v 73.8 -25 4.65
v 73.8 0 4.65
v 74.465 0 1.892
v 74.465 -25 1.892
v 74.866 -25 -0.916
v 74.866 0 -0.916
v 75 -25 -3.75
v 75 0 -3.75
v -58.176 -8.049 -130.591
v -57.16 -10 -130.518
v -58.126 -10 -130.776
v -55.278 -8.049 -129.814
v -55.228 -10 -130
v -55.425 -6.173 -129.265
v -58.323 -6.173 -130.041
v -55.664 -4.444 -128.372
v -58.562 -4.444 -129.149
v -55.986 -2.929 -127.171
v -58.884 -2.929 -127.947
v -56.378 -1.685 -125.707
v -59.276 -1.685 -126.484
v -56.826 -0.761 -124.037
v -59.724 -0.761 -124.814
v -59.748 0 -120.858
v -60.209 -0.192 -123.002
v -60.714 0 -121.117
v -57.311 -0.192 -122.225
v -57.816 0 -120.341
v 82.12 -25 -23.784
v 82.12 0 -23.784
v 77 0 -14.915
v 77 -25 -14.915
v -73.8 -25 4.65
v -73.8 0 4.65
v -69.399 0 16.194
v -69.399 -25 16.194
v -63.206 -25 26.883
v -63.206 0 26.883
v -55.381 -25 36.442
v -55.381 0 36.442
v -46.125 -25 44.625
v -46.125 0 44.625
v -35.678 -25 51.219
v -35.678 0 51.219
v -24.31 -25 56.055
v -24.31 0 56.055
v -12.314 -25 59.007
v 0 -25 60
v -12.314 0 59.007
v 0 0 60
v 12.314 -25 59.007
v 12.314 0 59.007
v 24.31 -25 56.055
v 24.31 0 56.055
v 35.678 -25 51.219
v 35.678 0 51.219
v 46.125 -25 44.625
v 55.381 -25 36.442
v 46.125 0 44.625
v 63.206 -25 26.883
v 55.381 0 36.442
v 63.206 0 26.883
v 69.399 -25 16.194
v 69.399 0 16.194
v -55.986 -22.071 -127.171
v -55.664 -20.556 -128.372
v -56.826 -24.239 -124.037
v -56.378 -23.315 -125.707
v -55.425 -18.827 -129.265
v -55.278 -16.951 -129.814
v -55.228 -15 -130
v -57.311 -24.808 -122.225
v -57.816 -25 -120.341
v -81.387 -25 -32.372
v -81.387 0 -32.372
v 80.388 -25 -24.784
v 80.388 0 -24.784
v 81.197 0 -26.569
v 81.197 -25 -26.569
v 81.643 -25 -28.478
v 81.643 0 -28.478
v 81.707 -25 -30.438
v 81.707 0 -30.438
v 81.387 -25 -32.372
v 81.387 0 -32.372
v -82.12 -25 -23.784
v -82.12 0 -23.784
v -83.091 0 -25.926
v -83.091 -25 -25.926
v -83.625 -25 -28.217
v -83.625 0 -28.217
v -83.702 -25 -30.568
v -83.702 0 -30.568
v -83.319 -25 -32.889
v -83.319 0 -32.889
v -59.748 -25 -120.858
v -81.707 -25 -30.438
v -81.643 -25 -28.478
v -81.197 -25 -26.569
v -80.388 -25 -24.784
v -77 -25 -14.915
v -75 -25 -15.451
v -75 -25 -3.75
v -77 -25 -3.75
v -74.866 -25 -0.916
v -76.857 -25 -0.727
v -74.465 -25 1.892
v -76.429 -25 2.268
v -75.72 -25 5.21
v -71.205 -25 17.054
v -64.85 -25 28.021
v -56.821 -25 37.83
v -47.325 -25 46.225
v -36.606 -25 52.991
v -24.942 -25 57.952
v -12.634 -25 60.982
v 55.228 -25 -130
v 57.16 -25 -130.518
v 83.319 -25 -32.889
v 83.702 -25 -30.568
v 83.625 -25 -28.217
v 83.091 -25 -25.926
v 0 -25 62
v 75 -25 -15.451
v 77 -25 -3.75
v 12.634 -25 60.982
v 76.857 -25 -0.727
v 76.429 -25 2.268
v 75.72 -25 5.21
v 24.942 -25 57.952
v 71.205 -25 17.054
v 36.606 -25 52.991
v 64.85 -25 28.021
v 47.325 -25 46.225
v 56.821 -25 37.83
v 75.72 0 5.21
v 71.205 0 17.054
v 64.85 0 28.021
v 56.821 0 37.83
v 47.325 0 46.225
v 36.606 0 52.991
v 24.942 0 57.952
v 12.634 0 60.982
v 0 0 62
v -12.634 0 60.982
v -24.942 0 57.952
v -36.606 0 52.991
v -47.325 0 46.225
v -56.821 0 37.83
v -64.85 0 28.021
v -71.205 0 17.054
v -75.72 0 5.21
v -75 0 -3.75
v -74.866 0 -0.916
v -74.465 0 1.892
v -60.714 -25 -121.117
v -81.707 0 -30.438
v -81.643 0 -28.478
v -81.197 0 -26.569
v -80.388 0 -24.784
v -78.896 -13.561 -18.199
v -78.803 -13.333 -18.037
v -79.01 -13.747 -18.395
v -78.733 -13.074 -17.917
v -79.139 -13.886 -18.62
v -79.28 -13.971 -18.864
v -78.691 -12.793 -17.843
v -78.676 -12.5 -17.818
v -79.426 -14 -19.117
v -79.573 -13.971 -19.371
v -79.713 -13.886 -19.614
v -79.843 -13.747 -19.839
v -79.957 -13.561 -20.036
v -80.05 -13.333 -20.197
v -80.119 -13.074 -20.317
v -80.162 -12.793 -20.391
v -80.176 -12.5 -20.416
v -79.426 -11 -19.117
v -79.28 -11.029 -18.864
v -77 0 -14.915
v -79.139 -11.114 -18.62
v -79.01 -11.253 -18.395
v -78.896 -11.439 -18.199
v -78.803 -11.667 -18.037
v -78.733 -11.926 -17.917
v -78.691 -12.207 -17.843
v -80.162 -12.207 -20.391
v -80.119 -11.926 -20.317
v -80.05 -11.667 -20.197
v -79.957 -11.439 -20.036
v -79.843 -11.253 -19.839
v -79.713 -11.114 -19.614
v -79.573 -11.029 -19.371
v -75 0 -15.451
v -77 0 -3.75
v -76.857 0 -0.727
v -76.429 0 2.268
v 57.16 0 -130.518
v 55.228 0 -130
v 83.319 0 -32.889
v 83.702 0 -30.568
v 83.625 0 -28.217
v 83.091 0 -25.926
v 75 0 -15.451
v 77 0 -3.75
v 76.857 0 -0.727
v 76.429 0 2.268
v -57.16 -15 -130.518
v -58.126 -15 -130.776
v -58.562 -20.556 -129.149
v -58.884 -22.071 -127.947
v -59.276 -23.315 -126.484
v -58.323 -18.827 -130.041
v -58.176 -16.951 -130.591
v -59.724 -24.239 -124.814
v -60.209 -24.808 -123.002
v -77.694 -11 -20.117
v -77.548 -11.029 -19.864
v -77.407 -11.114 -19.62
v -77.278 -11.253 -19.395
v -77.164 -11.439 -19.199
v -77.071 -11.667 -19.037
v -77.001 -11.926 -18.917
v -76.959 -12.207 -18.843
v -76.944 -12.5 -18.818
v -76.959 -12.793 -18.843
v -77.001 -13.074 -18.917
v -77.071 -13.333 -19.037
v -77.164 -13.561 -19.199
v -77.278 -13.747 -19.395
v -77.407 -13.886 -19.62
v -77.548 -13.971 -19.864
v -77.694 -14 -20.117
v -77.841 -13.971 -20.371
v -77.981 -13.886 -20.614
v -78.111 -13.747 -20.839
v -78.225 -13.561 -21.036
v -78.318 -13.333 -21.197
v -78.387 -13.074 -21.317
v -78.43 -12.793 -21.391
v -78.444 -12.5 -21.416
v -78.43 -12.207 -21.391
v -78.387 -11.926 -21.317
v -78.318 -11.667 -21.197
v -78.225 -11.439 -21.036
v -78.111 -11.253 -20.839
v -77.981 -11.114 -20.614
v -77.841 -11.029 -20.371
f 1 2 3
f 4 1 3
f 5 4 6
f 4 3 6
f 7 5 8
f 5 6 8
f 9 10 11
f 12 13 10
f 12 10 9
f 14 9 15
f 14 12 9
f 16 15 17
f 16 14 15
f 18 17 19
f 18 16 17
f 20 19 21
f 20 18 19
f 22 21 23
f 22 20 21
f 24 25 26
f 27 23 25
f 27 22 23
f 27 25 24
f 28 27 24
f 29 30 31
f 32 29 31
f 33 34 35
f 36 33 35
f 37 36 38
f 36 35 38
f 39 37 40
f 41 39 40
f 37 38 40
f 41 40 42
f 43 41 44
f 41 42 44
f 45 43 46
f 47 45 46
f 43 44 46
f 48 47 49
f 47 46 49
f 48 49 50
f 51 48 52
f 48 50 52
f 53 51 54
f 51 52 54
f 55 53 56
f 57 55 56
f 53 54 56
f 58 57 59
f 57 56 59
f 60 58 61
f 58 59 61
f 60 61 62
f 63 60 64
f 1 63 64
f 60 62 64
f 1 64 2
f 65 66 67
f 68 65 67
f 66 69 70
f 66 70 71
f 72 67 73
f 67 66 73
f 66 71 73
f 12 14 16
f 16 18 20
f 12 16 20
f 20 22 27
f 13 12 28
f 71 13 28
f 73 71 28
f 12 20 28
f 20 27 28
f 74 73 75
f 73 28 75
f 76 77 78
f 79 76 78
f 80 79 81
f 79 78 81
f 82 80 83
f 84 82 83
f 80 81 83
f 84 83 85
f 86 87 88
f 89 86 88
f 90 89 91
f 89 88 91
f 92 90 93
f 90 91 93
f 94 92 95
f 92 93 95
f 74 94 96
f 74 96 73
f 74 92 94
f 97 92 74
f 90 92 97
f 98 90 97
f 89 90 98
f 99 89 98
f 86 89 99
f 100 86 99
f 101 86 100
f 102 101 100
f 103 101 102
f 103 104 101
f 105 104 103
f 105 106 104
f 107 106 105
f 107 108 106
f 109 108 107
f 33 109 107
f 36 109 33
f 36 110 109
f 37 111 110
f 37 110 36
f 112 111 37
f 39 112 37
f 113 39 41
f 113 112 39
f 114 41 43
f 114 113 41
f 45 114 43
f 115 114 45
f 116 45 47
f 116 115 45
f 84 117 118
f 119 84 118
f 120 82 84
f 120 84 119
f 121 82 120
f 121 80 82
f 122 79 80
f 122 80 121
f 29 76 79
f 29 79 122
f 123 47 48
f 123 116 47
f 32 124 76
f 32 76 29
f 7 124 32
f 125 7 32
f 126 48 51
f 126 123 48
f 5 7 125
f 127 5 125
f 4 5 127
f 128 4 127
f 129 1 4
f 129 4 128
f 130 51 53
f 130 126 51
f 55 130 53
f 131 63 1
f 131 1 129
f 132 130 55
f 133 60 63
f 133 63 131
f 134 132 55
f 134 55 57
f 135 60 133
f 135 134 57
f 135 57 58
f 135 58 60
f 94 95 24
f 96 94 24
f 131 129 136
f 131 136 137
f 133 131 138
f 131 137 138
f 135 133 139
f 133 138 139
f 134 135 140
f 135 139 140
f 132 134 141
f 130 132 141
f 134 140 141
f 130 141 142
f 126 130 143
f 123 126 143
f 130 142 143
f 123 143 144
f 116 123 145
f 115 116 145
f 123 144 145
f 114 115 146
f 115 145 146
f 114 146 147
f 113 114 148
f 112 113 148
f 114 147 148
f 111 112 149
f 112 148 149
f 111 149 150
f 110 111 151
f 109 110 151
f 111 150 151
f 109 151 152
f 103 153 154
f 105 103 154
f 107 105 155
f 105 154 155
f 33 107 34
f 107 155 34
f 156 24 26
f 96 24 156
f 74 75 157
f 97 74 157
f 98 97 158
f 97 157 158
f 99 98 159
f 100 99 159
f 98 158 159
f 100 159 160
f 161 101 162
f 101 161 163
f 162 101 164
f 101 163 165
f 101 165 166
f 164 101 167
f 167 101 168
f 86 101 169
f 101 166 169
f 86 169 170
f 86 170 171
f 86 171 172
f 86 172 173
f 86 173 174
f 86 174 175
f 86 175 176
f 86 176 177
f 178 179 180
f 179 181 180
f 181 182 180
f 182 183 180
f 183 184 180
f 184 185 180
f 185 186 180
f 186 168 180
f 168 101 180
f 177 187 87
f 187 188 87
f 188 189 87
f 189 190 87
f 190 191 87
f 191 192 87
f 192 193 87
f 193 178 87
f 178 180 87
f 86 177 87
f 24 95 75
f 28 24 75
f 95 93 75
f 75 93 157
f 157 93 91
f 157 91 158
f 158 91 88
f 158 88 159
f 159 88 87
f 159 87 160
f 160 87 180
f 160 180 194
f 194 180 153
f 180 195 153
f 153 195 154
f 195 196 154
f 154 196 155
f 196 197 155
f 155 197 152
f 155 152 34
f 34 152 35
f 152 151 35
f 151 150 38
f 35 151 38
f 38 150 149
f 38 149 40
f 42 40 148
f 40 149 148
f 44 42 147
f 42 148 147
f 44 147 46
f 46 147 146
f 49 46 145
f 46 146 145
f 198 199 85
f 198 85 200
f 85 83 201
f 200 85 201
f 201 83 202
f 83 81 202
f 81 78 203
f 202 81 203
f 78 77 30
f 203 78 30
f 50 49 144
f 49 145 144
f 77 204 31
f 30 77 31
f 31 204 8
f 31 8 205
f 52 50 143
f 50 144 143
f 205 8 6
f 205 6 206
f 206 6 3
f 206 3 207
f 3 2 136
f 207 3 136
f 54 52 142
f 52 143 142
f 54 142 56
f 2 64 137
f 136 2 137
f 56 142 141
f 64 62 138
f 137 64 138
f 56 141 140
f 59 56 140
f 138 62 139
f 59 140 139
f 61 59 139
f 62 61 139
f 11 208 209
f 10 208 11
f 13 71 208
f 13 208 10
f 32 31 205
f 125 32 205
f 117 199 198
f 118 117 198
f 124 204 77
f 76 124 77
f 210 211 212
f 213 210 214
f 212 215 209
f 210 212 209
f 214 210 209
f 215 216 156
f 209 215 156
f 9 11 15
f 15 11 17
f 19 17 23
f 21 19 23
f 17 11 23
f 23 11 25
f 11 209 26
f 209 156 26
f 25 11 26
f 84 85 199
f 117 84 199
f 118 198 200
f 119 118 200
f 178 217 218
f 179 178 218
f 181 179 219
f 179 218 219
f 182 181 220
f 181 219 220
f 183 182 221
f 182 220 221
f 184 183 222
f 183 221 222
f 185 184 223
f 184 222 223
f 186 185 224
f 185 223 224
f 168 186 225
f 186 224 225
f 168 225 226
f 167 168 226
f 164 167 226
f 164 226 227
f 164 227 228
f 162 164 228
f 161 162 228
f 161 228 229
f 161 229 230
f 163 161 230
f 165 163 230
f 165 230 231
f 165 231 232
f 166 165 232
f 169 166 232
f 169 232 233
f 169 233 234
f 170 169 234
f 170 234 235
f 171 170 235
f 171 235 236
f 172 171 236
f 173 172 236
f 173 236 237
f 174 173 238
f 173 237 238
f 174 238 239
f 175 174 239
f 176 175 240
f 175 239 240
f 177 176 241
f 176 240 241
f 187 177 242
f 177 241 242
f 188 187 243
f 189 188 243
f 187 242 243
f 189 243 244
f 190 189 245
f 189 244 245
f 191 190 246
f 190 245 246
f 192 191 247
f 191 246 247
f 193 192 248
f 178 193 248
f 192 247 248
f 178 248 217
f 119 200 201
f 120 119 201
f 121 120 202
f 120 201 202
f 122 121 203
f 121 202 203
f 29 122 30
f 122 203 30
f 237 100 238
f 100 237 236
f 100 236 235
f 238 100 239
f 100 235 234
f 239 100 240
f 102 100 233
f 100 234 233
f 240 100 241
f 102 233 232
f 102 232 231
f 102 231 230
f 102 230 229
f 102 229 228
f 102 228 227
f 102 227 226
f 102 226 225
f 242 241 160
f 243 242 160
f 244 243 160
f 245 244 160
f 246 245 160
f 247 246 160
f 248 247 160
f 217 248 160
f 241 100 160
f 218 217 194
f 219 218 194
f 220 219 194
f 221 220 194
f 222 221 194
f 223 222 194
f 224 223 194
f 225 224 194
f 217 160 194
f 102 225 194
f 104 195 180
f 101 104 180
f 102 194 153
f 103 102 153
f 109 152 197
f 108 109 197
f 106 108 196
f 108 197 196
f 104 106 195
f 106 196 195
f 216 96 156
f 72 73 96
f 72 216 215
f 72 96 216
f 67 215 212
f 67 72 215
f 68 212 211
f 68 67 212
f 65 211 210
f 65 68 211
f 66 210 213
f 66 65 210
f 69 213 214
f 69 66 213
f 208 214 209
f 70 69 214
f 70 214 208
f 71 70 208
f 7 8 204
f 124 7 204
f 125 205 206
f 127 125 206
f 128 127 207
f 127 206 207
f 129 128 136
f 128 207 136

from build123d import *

# Parameters (mm, degrees)
F1_DEPTH = 25
F2_R     = 10
F3_R     = 1.5
F4_DEPTH = 25
F6_DEPTH = 3


with BuildPart() as f1:
    # F0 (on Front) → F1 (new body)
    with BuildSketch(Plane.XZ):
        with BuildLine():
            ThreePointArc((-73.8, 4.65), (-46.125, 44.625), (0, 60))
            Line((0, 60), (0, 62))
            ThreePointArc((0, 62), (-47.325, 46.225), (-75.72, 5.21))
            ThreePointArc((-75.72, 5.21), (-76.6783837972, 0.7754833996), (-77, -3.75))
            Line((-77, -3.75), (-77, -14.9147645484))
            Line((-77, -14.9147645484), (-82.1204376266, -23.7836226747))
            ThreePointArc((-82.1204376266, -23.7836226747), (-83.6254711177, -28.217308368), (-83.3192426967, -32.8894512159))
            Line((-83.3192426967, -32.8894512159), (-57.1598488652, -130.5176380902))
            Line((-57.1598488652, -130.5176380902), (-55.2279972126, -130))
            Line((-55.2279972126, -130), (-81.3873910441, -32.3718131257))
            ThreePointArc((-81.3873910441, -32.3718131257), (-81.6425813949, -28.4783607525), (-80.388386819, -24.7836226747))
            Line((-80.388386819, -24.7836226747), (-75, -15.4506629333))
            Line((-75, -15.4506629333), (-75, -3.75))
            ThreePointArc((-75, -3.75), (-74.6984848098, 0.4926406871), (-73.8, 4.65))
        make_face()
        with BuildLine():
            Line((0, 62), (0, 60))
            ThreePointArc((0, 60), (46.125, 44.625), (73.8, 4.65))
            ThreePointArc((73.8, 4.65), (74.6984848098, 0.4926406871), (75, -3.75))
            Line((75, -3.75), (75, -15.4506629333))
            Line((75, -15.4506629333), (80.388386819, -24.7836226747))
            ThreePointArc((80.388386819, -24.7836226747), (81.6425813949, -28.4783607525), (81.3873910441, -32.3718131257))
            Line((81.3873910441, -32.3718131257), (55.2279972126, -130))
            Line((55.2279972126, -130), (57.1598488652, -130.5176380902))
            Line((57.1598488652, -130.5176380902), (83.3192426967, -32.8894512159))
            ThreePointArc((83.3192426967, -32.8894512159), (83.6254711177, -28.217308368), (82.1204376266, -23.7836226747))
            Line((82.1204376266, -23.7836226747), (77, -14.9147645484))
            Line((77, -14.9147645484), (77, -3.75))
            ThreePointArc((77, -3.75), (76.6783837972, 0.7754833996), (75.72, 5.21))
            ThreePointArc((75.72, 5.21), (47.325, 46.225), (0, 62))
        make_face()
    extrude(amount=F1_DEPTH)

    # F2
    f2_edges = [f1.edges().sort_by_distance(p)[0] for p in [
        (-56.193923, -25, -130.258819),
        (-56.193923, 0, -130.258819),
    ]]
    fillet(f2_edges, radius=F2_R)

    # F3 (on face) → F4 (cut)
    with BuildSketch(Plane(origin=(-49.5596666972, 0, 28.6132869086), x_dir=(0, 1, 0), z_dir=(0.8660254038, 0, -0.5))):
        with Locations((-12.5, -56.2690534246)):
            Circle(F3_R)
    extrude(amount=-F4_DEPTH, mode=Mode.SUBTRACT)

    # F5 (on face) → F6 (join)
    with BuildSketch(Plane(origin=(-84.0284228994, 0, -22.5153480572), x_dir=(0, 1, 0), z_dir=(0.9659258263, 0, 0.2588190451))):
        with BuildLine():
            Line((0, -101.2762999161), (-25, -101.2762999161))
            ThreePointArc((-25, -101.2762999161), (-22.0710678119, -108.347367728), (-15, -111.2762999161))
            Line((-15, -111.2762999161), (-10, -111.2762999161))
            ThreePointArc((-10, -111.2762999161), (-2.9289321881, -108.347367728), (0, -101.2762999161))
        make_face()
    extrude(amount=-F6_DEPTH)


solid = f1.part
